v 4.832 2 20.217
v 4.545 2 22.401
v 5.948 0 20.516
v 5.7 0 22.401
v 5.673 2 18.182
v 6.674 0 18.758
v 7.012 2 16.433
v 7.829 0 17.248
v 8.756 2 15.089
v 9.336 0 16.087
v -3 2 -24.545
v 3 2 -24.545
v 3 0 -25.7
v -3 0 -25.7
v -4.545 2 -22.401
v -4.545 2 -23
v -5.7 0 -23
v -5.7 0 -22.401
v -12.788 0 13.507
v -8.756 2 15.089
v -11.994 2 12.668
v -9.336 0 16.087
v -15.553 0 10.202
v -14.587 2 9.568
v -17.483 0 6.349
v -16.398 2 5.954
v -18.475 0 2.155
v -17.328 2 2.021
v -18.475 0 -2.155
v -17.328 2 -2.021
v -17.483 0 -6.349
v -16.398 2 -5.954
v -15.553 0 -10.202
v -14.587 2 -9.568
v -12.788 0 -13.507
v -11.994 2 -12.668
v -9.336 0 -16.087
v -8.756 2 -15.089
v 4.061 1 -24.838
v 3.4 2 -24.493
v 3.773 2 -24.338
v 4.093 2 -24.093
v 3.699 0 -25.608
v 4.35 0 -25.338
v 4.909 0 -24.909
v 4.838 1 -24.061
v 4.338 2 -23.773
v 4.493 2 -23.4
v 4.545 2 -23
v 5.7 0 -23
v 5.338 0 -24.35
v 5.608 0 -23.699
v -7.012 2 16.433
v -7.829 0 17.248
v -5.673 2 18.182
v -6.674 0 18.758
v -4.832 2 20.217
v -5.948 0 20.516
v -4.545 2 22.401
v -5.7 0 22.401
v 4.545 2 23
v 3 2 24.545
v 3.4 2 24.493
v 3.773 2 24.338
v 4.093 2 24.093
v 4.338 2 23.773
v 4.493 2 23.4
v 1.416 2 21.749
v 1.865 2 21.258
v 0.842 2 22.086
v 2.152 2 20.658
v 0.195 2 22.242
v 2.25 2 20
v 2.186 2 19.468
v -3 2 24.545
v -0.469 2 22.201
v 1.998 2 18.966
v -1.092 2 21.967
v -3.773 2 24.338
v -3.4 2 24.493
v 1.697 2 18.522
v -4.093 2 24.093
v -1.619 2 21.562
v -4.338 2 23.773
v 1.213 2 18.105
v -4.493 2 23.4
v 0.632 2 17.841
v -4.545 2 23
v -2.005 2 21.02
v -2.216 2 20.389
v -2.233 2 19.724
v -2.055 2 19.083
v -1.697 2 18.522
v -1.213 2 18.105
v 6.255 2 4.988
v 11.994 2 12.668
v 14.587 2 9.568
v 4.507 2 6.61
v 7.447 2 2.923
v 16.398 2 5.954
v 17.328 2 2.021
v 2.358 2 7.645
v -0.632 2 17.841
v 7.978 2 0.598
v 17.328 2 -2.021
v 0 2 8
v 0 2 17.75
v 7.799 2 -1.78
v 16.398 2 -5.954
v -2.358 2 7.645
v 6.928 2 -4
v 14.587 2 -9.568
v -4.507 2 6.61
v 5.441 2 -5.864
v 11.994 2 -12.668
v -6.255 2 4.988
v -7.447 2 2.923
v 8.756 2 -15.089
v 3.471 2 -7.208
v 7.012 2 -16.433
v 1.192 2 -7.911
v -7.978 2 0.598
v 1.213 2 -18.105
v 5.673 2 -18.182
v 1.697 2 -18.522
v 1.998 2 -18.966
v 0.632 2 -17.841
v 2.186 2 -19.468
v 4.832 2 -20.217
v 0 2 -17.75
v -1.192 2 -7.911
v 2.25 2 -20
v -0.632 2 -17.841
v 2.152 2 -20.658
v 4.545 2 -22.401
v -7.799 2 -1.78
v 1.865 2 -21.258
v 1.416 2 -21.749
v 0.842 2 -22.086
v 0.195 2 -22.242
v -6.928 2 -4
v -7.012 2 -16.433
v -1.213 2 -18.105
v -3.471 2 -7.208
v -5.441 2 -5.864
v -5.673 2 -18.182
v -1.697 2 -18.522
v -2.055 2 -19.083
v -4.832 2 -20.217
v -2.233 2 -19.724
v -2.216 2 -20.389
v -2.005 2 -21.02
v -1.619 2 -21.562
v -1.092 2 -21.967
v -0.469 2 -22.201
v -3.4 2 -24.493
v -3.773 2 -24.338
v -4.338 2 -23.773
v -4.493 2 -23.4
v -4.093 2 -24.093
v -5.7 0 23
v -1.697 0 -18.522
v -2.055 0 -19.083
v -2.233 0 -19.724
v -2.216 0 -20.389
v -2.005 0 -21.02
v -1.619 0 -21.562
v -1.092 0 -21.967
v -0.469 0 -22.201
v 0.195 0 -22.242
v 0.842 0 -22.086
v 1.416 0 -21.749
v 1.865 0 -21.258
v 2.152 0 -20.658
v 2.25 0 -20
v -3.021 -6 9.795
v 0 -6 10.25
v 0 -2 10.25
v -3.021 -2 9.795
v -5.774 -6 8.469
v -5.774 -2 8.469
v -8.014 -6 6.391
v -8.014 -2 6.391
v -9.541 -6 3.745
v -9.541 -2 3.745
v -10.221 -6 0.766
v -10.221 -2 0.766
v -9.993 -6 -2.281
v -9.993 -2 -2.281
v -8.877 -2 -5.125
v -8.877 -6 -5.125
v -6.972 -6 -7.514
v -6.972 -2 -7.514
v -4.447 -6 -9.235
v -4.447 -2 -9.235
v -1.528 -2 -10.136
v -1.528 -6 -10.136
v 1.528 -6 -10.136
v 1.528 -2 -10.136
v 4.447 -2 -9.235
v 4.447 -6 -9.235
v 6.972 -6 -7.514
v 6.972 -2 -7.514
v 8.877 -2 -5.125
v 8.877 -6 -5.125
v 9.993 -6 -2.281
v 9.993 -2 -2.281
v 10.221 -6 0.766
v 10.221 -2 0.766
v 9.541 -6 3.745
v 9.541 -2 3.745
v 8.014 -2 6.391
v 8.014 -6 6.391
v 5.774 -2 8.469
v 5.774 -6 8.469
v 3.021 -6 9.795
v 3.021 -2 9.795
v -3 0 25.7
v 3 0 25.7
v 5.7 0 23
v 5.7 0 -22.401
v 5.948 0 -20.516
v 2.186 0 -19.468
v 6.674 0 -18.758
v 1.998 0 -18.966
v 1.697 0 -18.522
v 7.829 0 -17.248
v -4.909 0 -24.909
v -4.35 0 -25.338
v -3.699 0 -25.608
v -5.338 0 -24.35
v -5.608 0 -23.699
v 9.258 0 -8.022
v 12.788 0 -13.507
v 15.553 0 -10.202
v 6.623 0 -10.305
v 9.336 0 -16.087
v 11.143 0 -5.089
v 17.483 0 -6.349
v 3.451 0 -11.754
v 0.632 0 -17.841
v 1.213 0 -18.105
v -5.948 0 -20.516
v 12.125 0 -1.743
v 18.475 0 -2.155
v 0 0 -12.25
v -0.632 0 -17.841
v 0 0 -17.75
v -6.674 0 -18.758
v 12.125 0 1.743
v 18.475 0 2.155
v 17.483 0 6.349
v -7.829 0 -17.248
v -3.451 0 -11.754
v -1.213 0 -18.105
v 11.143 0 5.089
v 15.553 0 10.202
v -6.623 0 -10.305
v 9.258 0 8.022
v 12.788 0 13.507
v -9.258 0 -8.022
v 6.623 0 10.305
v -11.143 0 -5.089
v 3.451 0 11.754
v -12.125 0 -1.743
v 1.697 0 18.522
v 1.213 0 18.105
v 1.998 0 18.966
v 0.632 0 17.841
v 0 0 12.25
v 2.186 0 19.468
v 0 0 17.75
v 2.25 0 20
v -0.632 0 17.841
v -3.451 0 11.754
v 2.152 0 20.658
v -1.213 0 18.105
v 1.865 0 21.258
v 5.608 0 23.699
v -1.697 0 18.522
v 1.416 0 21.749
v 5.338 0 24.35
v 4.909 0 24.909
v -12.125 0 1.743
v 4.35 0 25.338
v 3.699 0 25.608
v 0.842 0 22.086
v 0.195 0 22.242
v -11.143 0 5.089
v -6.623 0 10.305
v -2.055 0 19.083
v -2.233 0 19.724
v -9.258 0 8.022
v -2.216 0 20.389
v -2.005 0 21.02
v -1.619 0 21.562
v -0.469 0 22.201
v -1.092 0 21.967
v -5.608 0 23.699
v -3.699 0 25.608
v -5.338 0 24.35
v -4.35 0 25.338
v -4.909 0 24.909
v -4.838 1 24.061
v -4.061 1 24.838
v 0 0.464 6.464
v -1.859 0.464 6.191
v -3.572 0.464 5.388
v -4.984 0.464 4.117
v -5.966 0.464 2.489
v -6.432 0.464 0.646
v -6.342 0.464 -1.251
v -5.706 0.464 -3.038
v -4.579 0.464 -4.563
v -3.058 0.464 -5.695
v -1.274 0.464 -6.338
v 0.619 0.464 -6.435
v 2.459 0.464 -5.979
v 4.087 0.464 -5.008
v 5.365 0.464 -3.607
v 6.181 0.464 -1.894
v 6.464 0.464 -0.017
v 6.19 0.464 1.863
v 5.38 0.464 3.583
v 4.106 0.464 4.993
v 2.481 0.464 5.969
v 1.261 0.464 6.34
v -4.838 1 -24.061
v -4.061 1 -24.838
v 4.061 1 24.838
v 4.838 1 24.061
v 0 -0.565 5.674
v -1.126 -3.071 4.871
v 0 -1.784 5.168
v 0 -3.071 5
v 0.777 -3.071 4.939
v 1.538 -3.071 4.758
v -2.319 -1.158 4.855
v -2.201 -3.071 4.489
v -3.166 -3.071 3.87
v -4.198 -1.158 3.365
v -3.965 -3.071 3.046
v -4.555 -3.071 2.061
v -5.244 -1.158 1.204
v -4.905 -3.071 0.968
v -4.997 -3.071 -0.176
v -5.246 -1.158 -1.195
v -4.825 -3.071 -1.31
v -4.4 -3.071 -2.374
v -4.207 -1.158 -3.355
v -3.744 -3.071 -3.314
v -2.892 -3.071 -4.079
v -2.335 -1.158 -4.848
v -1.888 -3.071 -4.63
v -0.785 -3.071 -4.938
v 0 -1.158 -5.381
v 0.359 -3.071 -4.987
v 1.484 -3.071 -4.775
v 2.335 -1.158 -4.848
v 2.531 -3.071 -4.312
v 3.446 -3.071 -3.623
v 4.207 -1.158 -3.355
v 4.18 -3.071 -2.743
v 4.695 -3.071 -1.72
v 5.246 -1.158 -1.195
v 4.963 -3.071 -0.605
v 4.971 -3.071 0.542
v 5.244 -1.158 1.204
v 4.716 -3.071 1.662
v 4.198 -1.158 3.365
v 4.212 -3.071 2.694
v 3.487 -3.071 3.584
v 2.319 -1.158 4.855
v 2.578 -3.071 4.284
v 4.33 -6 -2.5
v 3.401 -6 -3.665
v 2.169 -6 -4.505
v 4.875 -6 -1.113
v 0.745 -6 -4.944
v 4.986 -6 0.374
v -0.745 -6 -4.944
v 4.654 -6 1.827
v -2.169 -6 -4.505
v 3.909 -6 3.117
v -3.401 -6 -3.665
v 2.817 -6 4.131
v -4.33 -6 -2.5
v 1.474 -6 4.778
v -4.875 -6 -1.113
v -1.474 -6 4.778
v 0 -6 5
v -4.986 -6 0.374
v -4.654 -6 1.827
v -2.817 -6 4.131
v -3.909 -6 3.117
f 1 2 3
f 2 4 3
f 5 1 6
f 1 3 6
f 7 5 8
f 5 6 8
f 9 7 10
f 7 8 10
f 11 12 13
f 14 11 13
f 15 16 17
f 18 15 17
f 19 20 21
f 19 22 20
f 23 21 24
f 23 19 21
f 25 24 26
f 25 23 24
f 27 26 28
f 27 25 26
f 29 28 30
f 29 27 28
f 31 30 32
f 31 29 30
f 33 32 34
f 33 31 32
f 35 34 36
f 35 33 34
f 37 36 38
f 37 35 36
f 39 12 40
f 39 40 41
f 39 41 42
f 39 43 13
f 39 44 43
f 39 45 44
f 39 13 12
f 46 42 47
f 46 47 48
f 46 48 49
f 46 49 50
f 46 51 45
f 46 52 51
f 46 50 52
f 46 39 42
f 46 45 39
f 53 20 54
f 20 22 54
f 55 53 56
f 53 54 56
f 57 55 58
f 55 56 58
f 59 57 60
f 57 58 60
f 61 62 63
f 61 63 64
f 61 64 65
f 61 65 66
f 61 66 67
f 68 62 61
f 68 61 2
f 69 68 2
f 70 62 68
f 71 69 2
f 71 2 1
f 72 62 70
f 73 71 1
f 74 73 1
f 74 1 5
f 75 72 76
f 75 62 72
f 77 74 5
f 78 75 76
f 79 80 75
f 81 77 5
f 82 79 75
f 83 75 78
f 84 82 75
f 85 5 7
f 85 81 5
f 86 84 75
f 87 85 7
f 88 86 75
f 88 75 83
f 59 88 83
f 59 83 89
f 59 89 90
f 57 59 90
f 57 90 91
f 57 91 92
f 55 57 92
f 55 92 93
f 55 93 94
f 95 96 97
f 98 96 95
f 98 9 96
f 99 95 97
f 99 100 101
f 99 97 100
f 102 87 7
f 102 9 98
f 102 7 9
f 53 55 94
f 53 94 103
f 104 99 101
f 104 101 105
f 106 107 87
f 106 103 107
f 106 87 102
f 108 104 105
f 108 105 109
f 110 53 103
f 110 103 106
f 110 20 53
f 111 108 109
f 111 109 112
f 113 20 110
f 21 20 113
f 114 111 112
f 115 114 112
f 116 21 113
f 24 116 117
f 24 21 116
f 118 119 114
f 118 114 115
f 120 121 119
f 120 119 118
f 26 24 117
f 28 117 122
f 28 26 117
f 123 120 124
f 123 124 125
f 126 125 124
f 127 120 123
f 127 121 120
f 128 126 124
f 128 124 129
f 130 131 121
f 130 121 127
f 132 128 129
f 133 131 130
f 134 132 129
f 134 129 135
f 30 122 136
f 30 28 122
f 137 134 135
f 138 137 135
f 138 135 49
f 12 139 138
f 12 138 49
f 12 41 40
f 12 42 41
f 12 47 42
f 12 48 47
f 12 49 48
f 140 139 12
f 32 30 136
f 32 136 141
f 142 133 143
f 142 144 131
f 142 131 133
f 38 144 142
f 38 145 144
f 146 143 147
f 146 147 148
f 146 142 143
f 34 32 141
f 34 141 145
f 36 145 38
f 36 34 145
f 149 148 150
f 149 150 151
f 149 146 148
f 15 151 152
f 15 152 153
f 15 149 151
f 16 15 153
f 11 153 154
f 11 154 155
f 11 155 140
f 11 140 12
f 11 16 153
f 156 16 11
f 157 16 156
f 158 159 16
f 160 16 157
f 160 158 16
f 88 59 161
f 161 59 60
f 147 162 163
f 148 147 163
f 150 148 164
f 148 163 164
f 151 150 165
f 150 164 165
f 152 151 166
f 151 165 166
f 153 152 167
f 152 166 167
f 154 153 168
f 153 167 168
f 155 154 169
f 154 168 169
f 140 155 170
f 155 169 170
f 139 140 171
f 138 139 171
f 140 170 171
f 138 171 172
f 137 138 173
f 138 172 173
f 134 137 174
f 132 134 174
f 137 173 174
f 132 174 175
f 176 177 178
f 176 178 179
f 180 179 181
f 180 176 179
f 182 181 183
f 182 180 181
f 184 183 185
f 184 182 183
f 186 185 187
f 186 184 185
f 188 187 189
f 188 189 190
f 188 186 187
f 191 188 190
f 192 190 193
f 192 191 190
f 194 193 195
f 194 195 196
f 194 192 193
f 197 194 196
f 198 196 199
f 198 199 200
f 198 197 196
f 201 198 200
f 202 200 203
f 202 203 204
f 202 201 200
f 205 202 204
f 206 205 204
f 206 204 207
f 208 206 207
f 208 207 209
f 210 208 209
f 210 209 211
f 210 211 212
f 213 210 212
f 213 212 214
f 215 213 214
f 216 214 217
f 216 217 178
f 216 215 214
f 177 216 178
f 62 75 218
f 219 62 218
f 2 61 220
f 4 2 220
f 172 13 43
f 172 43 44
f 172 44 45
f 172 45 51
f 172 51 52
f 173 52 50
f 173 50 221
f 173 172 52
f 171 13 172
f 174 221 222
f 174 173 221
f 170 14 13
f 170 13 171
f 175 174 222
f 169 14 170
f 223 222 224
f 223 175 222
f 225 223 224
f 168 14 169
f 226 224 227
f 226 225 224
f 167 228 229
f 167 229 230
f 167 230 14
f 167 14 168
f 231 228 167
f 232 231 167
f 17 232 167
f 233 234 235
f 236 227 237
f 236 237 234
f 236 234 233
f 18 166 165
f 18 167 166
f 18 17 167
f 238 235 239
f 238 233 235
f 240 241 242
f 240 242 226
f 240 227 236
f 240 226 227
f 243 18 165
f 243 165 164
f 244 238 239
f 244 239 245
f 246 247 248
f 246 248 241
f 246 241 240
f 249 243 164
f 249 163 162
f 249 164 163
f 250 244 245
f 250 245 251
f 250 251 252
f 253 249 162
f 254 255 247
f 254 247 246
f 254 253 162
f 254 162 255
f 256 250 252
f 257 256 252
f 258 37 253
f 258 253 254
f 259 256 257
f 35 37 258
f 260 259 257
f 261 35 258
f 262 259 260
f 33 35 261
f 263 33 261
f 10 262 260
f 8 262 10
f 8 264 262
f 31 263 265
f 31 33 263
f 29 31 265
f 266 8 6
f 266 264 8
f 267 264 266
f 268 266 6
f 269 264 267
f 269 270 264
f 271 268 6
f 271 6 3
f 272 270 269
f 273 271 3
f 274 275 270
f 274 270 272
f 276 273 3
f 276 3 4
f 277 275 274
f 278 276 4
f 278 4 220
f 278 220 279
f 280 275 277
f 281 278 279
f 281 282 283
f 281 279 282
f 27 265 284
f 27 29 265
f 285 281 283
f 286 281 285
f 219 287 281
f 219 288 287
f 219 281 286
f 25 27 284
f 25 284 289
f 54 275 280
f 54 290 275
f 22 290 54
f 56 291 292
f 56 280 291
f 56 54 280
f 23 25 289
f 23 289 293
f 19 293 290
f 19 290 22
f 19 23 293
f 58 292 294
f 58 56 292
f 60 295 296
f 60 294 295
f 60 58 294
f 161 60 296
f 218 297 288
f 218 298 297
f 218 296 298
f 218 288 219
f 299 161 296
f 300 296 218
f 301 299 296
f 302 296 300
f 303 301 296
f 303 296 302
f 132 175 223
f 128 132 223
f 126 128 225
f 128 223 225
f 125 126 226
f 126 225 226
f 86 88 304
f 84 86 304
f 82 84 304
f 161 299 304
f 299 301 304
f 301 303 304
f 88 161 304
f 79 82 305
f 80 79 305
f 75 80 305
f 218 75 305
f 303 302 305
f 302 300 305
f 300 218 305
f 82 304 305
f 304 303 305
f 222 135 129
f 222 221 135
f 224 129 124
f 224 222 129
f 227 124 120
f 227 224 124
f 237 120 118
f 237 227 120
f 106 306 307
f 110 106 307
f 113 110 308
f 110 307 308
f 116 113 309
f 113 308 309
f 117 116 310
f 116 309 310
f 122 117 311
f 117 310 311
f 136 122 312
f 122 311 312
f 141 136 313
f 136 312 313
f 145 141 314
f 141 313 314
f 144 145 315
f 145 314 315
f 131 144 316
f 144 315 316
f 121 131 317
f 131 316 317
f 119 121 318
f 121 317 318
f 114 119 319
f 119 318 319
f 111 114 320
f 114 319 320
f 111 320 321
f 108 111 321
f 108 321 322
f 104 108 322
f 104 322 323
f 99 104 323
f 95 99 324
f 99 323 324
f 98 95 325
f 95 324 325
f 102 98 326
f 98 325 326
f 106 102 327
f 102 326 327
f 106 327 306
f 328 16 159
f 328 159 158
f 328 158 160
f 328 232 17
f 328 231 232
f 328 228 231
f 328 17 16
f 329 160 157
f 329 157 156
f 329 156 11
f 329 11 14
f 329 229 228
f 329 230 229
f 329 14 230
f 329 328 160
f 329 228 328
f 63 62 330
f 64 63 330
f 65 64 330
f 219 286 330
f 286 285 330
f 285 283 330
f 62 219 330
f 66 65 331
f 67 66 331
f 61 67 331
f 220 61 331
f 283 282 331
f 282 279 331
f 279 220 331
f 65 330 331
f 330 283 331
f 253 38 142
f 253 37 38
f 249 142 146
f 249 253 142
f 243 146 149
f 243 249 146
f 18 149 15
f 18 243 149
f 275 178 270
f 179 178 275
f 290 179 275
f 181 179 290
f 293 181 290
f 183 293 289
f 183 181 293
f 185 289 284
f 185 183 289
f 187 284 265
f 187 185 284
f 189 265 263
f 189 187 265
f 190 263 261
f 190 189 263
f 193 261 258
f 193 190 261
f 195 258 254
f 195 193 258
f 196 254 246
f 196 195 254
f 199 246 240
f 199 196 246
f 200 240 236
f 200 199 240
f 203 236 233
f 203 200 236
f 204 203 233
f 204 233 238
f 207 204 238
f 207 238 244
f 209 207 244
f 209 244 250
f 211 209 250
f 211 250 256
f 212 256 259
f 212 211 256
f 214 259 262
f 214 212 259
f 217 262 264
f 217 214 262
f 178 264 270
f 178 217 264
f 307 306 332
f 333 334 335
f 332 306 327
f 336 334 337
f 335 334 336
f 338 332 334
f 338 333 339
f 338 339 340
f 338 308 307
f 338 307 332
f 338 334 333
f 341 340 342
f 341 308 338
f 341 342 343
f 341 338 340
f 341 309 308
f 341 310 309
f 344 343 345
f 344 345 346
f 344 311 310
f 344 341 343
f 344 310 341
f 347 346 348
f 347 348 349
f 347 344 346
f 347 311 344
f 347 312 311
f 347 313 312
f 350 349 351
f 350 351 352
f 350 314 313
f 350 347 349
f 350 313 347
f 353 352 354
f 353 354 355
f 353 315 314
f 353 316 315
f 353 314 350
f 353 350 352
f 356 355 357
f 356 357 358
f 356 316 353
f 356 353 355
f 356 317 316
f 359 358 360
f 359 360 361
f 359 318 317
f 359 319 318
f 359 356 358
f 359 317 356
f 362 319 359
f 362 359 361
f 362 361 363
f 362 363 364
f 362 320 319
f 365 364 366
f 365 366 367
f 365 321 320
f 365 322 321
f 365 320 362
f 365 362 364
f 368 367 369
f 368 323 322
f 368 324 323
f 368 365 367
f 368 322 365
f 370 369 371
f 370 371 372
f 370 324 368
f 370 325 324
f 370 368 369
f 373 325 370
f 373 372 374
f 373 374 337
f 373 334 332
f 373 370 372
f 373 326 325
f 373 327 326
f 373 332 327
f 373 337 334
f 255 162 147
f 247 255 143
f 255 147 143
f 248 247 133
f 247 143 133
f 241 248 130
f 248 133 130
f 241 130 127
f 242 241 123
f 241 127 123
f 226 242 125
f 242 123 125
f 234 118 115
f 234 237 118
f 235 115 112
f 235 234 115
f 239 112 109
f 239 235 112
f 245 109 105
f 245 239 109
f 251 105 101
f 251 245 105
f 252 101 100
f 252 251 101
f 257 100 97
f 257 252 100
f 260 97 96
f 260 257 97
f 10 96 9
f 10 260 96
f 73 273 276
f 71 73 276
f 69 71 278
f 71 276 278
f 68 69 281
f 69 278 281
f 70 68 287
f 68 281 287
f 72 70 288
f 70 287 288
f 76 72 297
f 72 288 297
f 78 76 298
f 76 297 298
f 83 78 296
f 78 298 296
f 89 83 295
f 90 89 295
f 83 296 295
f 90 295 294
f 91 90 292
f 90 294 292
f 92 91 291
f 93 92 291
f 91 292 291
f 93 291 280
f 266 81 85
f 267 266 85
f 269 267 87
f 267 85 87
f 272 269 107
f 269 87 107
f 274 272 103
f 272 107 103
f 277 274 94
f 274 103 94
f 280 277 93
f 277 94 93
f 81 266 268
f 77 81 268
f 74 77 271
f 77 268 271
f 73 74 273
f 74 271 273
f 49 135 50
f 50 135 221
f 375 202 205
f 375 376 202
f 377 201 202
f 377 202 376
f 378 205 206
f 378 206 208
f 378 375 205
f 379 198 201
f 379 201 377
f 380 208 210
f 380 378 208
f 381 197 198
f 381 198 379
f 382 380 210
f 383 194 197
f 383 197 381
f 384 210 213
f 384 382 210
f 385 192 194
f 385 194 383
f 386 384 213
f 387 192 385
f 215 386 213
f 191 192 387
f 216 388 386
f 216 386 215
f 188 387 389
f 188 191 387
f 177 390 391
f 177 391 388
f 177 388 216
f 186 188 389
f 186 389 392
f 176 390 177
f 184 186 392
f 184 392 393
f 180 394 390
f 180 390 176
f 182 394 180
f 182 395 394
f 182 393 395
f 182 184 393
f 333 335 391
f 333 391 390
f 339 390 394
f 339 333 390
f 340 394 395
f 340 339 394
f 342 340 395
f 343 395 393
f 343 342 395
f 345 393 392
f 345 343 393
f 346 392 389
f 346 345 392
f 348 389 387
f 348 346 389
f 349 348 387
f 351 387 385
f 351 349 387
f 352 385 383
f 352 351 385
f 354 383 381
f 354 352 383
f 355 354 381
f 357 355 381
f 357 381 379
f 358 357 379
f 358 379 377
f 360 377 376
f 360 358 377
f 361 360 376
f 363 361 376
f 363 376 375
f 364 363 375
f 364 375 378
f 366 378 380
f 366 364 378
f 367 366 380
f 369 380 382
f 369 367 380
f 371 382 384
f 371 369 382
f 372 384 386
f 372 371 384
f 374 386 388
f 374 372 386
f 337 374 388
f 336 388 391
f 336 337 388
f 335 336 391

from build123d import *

# Parameters (mm, degrees)
BOSS_EXTRUDE1_START = -2
BOSS_EXTRUDE1_DEPTH = 2
CUT_EXTRUDE1_REACH  = 34.718
SKETCH2_3_R         = 2.25
FILLET1_R           = 7.3
FILLET2_R           = 2.7
CHAMFER1_SIZE       = 1.154700538
CHAMFER1_SIZE_2     = 2
CHAMFER2_SIZE       = 3
FILLET3_R           = 5
CHAMFER3_SIZE       = 2


with BuildPart() as part:
    # Sketch1 → Revolve1 (revolve)
    with BuildSketch(Plane.XY, mode=Mode.PRIVATE) as revolve1_sk:
        Polygon((-5, 0), (-5, 2), (-18.6, 2), (-18.6, 0), (-10.25, 0), (-10.25, -6), (-5, -6), align=None)
    revolve(revolve1_sk.sketch.rotate(Axis((0, 9.858601723, 0), (0, -1, 0)), 270), axis=Axis((0, 9.858601723, 0), (0, -1, 0)))

    # Sketch2 → Boss-Extrude1 (add)
    with BuildSketch(Plane(origin=(0, 2, 0), x_dir=(1, 0, 0), z_dir=(0, 1, 0)).offset(BOSS_EXTRUDE1_START)):
        with BuildLine():
            Line((-5.7, 25.7), (-5.7, 17.705084016))
            ThreePointArc((-5.7, 17.705084016), (-3.720937263, 18.224012343), (-1.696852692, 18.5224375))
            ThreePointArc((-1.696852692, 18.5224375), (-0.788854056, 22.10718041), (2.25, 20))
            ThreePointArc((2.25, 20), (2.10718041, 19.211145944), (1.696852692, 18.5224375))
            ThreePointArc((1.696852692, 18.5224375), (3.720937263, 18.224012343), (5.7, 17.705084016))
            Line((5.7, 17.705084016), (5.7, 25.7))
            Line((5.7, 25.7), (0.005376723, 25.7))
            Line((0.005376723, 25.7), (-0.005376723, 25.7))
            Line((-0.005376723, 25.7), (-5.7, 25.7))
        make_face()
        with BuildLine():
            ThreePointArc((-1.696852692, -18.5224375), (-3.720937263, -18.224012343), (-5.7, -17.705084016))
            Line((-5.7, -17.705084016), (-5.7, -25.7))
            Line((-5.7, -25.7), (-0.005376723, -25.7))
            Line((-0.005376723, -25.7), (0.005376723, -25.7))
            Line((0.005376723, -25.7), (5.7, -25.7))
            Line((5.7, -25.7), (5.7, -17.705084016))
            ThreePointArc((5.7, -17.705084016), (3.720937263, -18.224012343), (1.696852692, -18.5224375))
            ThreePointArc((1.696852692, -18.5224375), (2.10718041, -19.211145944), (2.25, -20))
            ThreePointArc((2.25, -20), (-0.788854056, -22.10718041), (-1.696852692, -18.5224375))
        make_face()
    extrude(amount=BOSS_EXTRUDE1_DEPTH)

    # Sketch2<3> → Cut-Extrude1 (cut, up to next)
    with BuildSketch(Plane(origin=(0, 2, 0), x_dir=(1, 0, 0), z_dir=(0, 1, 0)), mode=Mode.PRIVATE) as cut_extrude1_sk1:
        with Locations(Location((0, 20, 0), (0, 0, 270))):
            Circle(SKETCH2_3_R)
    cut_extrude1_tool1 = extrude(cut_extrude1_sk1.sketch, amount=-CUT_EXTRUDE1_REACH, mode=Mode.PRIVATE) & part.part
    # Sketch2<3> → Cut-Extrude1 (cut, up to next)
    with BuildSketch(Plane(origin=(0, 2, 0), x_dir=(1, 0, 0), z_dir=(0, 1, 0)), mode=Mode.PRIVATE) as cut_extrude1_sk2:
        with Locations(Location((0, -20, 0), (0, 0, 270))):
            Circle(SKETCH2_3_R)
    cut_extrude1_tool2 = extrude(cut_extrude1_sk2.sketch, amount=-CUT_EXTRUDE1_REACH, mode=Mode.PRIVATE) & part.part
    add(cut_extrude1_tool1.solids().sort_by_distance((0, 2, -20))[0], mode=Mode.SUBTRACT)
    add(cut_extrude1_tool2.solids().sort_by_distance((0, 2, 20))[0], mode=Mode.SUBTRACT)

    # Fillet1
    fillet1_edges = [part.edges().sort_by_distance(p)[0] for p in [
        (-5.7, 1, -17.705084016),
        (5.7, 1, -17.705084016),
        (-5.7, 1, 17.705084016),
        (5.7, 1, 17.705084016),
    ]]
    fillet(fillet1_edges, radius=FILLET1_R)

    # Fillet2
    fillet2_edges = [part.edges().sort_by_distance(p)[0] for p in [
        (-5.7, 1, -25.7),
        (5.7, 1, -25.7),
        (-5.7, 1, 25.7),
        (5.7, 1, 25.7),
    ]]
    fillet(fillet2_edges, radius=FILLET2_R)

    # Chamfer1
    # the kernel refuses this chamfer: 2, 1.154700538 mm, written as the material it takes off along each edge
    with BuildSketch(Plane(origin=(3, 2, 25.7), x_dir=(0, 0.05789386240267148, -0.9983227437537925), z_dir=(-1, 0, 0)), Plane(origin=(-3, 2, -25.7), x_dir=(0, 0.05789386240267148, 0.9983227437537925), z_dir=(1, 0, 0))) as chamfer1_piece_1:
        Polygon((CHAMFER1_SIZE * 0.998322744082, CHAMFER1_SIZE * 0.0578938624217), (-CHAMFER1_SIZE_2 * 0.0578938624027, CHAMFER1_SIZE_2 * 0.998322743754), (0, 0), align=None)
    extrude(amount=6, mode=Mode.SUBTRACT)
    with BuildSketch(Plane(origin=(5.7, 2, 23), x_dir=(-0.9983227437537925, 0.05789386240267148, 0), z_dir=(0, 0, -1)), Plane(origin=(-5.7, 2, 22.401116044), x_dir=(0.9983227437537925, 0.05789386240267148, 0), z_dir=(0, 0, 1)), Plane(origin=(5.7, 2, -22.401116044), x_dir=(-0.9983227437537925, 0.05789386240267148, 0), z_dir=(0, 0, -1)), Plane(origin=(-5.7, 2, -23), x_dir=(0.9983227437537925, 0.05789386240267148, 0), z_dir=(0, 0, 1))) as chamfer1_piece_2:
        Polygon((CHAMFER1_SIZE * 0.998322744082, -CHAMFER1_SIZE * 0.0578938624217), (-CHAMFER1_SIZE_2 * 0.0578938624027, -CHAMFER1_SIZE_2 * 0.998322743754), (0, 0), align=None)
    extrude(amount=0.598883956, mode=Mode.SUBTRACT)
    with BuildSketch(Plane(origin=(13, 2, 22.401116044), x_dir=(-1, 0, 0), z_dir=(0, 0, 1))) as chamfer1_piece_3:
        Polygon((7.3 + CHAMFER1_SIZE, 0), (7.3, CHAMFER1_SIZE_2), (7.3, 0), align=None)
    revolve(axis=Axis((13, 2, 22.401116044), (0, -1, 0)), revolution_arc=59.87219662, mode=Mode.SUBTRACT)
    with BuildSketch(Plane(origin=(-13, 2, 22.401116044), x_dir=(0.5019305019305016, 0, -0.8649079553523569), z_dir=(-0.8649079553523569, 0, -0.5019305019305016))) as chamfer1_piece_4:
        Polygon((7.3 + CHAMFER1_SIZE, 0), (7.3, CHAMFER1_SIZE_2), (7.3, 0), align=None)
    revolve(axis=Axis((-13, 2, 22.401116044), (0, -1, 0)), revolution_arc=59.87219662, mode=Mode.SUBTRACT)
    with BuildSketch(Plane(origin=(0, 2, 0), x_dir=(0.5019305019305017, 0, -0.8649079553523569), z_dir=(-0.8649079553523569, 0, -0.5019305019305017))) as chamfer1_piece_5:
        Polygon((18.6 - CHAMFER1_SIZE, 0), (18.6, CHAMFER1_SIZE_2), (18.6, 0), align=None)
    revolve(axis=Axis((0, 2, 0), (0, -1, 0)), revolution_arc=119.74439324, mode=Mode.SUBTRACT)
    with BuildSketch(Plane(origin=(0, 2, 0), x_dir=(-0.5019305019305019, 0, 0.8649079553523568), z_dir=(0.8649079553523568, 0, 0.5019305019305019))) as chamfer1_piece_6:
        Polygon((18.6 - CHAMFER1_SIZE, 0), (18.6, CHAMFER1_SIZE_2), (18.6, 0), align=None)
    revolve(axis=Axis((0, 2, 0), (0, -1, 0)), revolution_arc=119.74439324, mode=Mode.SUBTRACT)
    with BuildSketch(Plane(origin=(13, 2, -22.401116044), x_dir=(-1, 0, 0), z_dir=(0, 0, -1))) as chamfer1_piece_7:
        Polygon((7.3 + CHAMFER1_SIZE, 0), (7.3, -CHAMFER1_SIZE_2), (7.3, 0), align=None)
    revolve(axis=Axis((13, 2, -22.401116044), (0, 1, 0)), revolution_arc=59.87219662, mode=Mode.SUBTRACT)
    with BuildSketch(Plane(origin=(-13, 2, -22.401116044), x_dir=(0.5019305019305013, 0, 0.8649079553523572), z_dir=(-0.8649079553523572, 0, 0.5019305019305013))) as chamfer1_piece_8:
        Polygon((7.3 + CHAMFER1_SIZE, 0), (7.3, -CHAMFER1_SIZE_2), (7.3, 0), align=None)
    revolve(axis=Axis((-13, 2, -22.401116044), (0, 1, 0)), revolution_arc=59.87219662, mode=Mode.SUBTRACT)
    with BuildSketch(Plane(origin=(3, 2, 23), x_dir=(0, 0, 1), z_dir=(-1, 0, 0))) as chamfer1_piece_9:
        Polygon((2.7 - CHAMFER1_SIZE, 0), (2.7, -CHAMFER1_SIZE_2), (2.7, 0), align=None)
    revolve(axis=Axis((3, 2, 23), (0, 1, 0)), revolution_arc=90, mode=Mode.SUBTRACT)
    with BuildSketch(Plane(origin=(-3, 2, 23), x_dir=(-1, 0, 0), z_dir=(0, 0, -1))) as chamfer1_piece_10:
        Polygon((2.7 - CHAMFER1_SIZE, 0), (2.7, -CHAMFER1_SIZE_2), (2.7, 0), align=None)
    revolve(axis=Axis((-3, 2, 23), (0, 1, 0)), revolution_arc=90, mode=Mode.SUBTRACT)
    with BuildSketch(Plane(origin=(3, 2, -23), x_dir=(0, 0, -1), z_dir=(-1, 0, 0))) as chamfer1_piece_11:
        Polygon((2.7 - CHAMFER1_SIZE, 0), (2.7, CHAMFER1_SIZE_2), (2.7, 0), align=None)
    revolve(axis=Axis((3, 2, -23), (0, -1, 0)), revolution_arc=90, mode=Mode.SUBTRACT)
    with BuildSketch(Plane(origin=(-3, 2, -23), x_dir=(-1, 0, 0), z_dir=(0, 0, 1))) as chamfer1_piece_12:
        Polygon((2.7 - CHAMFER1_SIZE, 0), (2.7, CHAMFER1_SIZE_2), (2.7, 0), align=None)
    revolve(axis=Axis((-3, 2, -23), (0, -1, 0)), revolution_arc=90, mode=Mode.SUBTRACT)

    # Chamfer2
    chamfer2_edges = [part.edges().sort_by_distance(p)[0] for p in [
        (0, 2, -5),
    ]]
    chamfer(chamfer2_edges, length=CHAMFER2_SIZE)

    # Fillet3
    fillet3_edges = [part.edges().sort_by_distance(p)[0] for p in [
        (0, -1, -5),
    ]]
    fillet(fillet3_edges, radius=FILLET3_R)

    # Chamfer3
    chamfer3_edges = [part.edges().sort_by_distance(p)[0] for p in [
        (0, 0, -10.25),
    ]]
    chamfer(chamfer3_edges, length=CHAMFER3_SIZE)


solid = part.part
